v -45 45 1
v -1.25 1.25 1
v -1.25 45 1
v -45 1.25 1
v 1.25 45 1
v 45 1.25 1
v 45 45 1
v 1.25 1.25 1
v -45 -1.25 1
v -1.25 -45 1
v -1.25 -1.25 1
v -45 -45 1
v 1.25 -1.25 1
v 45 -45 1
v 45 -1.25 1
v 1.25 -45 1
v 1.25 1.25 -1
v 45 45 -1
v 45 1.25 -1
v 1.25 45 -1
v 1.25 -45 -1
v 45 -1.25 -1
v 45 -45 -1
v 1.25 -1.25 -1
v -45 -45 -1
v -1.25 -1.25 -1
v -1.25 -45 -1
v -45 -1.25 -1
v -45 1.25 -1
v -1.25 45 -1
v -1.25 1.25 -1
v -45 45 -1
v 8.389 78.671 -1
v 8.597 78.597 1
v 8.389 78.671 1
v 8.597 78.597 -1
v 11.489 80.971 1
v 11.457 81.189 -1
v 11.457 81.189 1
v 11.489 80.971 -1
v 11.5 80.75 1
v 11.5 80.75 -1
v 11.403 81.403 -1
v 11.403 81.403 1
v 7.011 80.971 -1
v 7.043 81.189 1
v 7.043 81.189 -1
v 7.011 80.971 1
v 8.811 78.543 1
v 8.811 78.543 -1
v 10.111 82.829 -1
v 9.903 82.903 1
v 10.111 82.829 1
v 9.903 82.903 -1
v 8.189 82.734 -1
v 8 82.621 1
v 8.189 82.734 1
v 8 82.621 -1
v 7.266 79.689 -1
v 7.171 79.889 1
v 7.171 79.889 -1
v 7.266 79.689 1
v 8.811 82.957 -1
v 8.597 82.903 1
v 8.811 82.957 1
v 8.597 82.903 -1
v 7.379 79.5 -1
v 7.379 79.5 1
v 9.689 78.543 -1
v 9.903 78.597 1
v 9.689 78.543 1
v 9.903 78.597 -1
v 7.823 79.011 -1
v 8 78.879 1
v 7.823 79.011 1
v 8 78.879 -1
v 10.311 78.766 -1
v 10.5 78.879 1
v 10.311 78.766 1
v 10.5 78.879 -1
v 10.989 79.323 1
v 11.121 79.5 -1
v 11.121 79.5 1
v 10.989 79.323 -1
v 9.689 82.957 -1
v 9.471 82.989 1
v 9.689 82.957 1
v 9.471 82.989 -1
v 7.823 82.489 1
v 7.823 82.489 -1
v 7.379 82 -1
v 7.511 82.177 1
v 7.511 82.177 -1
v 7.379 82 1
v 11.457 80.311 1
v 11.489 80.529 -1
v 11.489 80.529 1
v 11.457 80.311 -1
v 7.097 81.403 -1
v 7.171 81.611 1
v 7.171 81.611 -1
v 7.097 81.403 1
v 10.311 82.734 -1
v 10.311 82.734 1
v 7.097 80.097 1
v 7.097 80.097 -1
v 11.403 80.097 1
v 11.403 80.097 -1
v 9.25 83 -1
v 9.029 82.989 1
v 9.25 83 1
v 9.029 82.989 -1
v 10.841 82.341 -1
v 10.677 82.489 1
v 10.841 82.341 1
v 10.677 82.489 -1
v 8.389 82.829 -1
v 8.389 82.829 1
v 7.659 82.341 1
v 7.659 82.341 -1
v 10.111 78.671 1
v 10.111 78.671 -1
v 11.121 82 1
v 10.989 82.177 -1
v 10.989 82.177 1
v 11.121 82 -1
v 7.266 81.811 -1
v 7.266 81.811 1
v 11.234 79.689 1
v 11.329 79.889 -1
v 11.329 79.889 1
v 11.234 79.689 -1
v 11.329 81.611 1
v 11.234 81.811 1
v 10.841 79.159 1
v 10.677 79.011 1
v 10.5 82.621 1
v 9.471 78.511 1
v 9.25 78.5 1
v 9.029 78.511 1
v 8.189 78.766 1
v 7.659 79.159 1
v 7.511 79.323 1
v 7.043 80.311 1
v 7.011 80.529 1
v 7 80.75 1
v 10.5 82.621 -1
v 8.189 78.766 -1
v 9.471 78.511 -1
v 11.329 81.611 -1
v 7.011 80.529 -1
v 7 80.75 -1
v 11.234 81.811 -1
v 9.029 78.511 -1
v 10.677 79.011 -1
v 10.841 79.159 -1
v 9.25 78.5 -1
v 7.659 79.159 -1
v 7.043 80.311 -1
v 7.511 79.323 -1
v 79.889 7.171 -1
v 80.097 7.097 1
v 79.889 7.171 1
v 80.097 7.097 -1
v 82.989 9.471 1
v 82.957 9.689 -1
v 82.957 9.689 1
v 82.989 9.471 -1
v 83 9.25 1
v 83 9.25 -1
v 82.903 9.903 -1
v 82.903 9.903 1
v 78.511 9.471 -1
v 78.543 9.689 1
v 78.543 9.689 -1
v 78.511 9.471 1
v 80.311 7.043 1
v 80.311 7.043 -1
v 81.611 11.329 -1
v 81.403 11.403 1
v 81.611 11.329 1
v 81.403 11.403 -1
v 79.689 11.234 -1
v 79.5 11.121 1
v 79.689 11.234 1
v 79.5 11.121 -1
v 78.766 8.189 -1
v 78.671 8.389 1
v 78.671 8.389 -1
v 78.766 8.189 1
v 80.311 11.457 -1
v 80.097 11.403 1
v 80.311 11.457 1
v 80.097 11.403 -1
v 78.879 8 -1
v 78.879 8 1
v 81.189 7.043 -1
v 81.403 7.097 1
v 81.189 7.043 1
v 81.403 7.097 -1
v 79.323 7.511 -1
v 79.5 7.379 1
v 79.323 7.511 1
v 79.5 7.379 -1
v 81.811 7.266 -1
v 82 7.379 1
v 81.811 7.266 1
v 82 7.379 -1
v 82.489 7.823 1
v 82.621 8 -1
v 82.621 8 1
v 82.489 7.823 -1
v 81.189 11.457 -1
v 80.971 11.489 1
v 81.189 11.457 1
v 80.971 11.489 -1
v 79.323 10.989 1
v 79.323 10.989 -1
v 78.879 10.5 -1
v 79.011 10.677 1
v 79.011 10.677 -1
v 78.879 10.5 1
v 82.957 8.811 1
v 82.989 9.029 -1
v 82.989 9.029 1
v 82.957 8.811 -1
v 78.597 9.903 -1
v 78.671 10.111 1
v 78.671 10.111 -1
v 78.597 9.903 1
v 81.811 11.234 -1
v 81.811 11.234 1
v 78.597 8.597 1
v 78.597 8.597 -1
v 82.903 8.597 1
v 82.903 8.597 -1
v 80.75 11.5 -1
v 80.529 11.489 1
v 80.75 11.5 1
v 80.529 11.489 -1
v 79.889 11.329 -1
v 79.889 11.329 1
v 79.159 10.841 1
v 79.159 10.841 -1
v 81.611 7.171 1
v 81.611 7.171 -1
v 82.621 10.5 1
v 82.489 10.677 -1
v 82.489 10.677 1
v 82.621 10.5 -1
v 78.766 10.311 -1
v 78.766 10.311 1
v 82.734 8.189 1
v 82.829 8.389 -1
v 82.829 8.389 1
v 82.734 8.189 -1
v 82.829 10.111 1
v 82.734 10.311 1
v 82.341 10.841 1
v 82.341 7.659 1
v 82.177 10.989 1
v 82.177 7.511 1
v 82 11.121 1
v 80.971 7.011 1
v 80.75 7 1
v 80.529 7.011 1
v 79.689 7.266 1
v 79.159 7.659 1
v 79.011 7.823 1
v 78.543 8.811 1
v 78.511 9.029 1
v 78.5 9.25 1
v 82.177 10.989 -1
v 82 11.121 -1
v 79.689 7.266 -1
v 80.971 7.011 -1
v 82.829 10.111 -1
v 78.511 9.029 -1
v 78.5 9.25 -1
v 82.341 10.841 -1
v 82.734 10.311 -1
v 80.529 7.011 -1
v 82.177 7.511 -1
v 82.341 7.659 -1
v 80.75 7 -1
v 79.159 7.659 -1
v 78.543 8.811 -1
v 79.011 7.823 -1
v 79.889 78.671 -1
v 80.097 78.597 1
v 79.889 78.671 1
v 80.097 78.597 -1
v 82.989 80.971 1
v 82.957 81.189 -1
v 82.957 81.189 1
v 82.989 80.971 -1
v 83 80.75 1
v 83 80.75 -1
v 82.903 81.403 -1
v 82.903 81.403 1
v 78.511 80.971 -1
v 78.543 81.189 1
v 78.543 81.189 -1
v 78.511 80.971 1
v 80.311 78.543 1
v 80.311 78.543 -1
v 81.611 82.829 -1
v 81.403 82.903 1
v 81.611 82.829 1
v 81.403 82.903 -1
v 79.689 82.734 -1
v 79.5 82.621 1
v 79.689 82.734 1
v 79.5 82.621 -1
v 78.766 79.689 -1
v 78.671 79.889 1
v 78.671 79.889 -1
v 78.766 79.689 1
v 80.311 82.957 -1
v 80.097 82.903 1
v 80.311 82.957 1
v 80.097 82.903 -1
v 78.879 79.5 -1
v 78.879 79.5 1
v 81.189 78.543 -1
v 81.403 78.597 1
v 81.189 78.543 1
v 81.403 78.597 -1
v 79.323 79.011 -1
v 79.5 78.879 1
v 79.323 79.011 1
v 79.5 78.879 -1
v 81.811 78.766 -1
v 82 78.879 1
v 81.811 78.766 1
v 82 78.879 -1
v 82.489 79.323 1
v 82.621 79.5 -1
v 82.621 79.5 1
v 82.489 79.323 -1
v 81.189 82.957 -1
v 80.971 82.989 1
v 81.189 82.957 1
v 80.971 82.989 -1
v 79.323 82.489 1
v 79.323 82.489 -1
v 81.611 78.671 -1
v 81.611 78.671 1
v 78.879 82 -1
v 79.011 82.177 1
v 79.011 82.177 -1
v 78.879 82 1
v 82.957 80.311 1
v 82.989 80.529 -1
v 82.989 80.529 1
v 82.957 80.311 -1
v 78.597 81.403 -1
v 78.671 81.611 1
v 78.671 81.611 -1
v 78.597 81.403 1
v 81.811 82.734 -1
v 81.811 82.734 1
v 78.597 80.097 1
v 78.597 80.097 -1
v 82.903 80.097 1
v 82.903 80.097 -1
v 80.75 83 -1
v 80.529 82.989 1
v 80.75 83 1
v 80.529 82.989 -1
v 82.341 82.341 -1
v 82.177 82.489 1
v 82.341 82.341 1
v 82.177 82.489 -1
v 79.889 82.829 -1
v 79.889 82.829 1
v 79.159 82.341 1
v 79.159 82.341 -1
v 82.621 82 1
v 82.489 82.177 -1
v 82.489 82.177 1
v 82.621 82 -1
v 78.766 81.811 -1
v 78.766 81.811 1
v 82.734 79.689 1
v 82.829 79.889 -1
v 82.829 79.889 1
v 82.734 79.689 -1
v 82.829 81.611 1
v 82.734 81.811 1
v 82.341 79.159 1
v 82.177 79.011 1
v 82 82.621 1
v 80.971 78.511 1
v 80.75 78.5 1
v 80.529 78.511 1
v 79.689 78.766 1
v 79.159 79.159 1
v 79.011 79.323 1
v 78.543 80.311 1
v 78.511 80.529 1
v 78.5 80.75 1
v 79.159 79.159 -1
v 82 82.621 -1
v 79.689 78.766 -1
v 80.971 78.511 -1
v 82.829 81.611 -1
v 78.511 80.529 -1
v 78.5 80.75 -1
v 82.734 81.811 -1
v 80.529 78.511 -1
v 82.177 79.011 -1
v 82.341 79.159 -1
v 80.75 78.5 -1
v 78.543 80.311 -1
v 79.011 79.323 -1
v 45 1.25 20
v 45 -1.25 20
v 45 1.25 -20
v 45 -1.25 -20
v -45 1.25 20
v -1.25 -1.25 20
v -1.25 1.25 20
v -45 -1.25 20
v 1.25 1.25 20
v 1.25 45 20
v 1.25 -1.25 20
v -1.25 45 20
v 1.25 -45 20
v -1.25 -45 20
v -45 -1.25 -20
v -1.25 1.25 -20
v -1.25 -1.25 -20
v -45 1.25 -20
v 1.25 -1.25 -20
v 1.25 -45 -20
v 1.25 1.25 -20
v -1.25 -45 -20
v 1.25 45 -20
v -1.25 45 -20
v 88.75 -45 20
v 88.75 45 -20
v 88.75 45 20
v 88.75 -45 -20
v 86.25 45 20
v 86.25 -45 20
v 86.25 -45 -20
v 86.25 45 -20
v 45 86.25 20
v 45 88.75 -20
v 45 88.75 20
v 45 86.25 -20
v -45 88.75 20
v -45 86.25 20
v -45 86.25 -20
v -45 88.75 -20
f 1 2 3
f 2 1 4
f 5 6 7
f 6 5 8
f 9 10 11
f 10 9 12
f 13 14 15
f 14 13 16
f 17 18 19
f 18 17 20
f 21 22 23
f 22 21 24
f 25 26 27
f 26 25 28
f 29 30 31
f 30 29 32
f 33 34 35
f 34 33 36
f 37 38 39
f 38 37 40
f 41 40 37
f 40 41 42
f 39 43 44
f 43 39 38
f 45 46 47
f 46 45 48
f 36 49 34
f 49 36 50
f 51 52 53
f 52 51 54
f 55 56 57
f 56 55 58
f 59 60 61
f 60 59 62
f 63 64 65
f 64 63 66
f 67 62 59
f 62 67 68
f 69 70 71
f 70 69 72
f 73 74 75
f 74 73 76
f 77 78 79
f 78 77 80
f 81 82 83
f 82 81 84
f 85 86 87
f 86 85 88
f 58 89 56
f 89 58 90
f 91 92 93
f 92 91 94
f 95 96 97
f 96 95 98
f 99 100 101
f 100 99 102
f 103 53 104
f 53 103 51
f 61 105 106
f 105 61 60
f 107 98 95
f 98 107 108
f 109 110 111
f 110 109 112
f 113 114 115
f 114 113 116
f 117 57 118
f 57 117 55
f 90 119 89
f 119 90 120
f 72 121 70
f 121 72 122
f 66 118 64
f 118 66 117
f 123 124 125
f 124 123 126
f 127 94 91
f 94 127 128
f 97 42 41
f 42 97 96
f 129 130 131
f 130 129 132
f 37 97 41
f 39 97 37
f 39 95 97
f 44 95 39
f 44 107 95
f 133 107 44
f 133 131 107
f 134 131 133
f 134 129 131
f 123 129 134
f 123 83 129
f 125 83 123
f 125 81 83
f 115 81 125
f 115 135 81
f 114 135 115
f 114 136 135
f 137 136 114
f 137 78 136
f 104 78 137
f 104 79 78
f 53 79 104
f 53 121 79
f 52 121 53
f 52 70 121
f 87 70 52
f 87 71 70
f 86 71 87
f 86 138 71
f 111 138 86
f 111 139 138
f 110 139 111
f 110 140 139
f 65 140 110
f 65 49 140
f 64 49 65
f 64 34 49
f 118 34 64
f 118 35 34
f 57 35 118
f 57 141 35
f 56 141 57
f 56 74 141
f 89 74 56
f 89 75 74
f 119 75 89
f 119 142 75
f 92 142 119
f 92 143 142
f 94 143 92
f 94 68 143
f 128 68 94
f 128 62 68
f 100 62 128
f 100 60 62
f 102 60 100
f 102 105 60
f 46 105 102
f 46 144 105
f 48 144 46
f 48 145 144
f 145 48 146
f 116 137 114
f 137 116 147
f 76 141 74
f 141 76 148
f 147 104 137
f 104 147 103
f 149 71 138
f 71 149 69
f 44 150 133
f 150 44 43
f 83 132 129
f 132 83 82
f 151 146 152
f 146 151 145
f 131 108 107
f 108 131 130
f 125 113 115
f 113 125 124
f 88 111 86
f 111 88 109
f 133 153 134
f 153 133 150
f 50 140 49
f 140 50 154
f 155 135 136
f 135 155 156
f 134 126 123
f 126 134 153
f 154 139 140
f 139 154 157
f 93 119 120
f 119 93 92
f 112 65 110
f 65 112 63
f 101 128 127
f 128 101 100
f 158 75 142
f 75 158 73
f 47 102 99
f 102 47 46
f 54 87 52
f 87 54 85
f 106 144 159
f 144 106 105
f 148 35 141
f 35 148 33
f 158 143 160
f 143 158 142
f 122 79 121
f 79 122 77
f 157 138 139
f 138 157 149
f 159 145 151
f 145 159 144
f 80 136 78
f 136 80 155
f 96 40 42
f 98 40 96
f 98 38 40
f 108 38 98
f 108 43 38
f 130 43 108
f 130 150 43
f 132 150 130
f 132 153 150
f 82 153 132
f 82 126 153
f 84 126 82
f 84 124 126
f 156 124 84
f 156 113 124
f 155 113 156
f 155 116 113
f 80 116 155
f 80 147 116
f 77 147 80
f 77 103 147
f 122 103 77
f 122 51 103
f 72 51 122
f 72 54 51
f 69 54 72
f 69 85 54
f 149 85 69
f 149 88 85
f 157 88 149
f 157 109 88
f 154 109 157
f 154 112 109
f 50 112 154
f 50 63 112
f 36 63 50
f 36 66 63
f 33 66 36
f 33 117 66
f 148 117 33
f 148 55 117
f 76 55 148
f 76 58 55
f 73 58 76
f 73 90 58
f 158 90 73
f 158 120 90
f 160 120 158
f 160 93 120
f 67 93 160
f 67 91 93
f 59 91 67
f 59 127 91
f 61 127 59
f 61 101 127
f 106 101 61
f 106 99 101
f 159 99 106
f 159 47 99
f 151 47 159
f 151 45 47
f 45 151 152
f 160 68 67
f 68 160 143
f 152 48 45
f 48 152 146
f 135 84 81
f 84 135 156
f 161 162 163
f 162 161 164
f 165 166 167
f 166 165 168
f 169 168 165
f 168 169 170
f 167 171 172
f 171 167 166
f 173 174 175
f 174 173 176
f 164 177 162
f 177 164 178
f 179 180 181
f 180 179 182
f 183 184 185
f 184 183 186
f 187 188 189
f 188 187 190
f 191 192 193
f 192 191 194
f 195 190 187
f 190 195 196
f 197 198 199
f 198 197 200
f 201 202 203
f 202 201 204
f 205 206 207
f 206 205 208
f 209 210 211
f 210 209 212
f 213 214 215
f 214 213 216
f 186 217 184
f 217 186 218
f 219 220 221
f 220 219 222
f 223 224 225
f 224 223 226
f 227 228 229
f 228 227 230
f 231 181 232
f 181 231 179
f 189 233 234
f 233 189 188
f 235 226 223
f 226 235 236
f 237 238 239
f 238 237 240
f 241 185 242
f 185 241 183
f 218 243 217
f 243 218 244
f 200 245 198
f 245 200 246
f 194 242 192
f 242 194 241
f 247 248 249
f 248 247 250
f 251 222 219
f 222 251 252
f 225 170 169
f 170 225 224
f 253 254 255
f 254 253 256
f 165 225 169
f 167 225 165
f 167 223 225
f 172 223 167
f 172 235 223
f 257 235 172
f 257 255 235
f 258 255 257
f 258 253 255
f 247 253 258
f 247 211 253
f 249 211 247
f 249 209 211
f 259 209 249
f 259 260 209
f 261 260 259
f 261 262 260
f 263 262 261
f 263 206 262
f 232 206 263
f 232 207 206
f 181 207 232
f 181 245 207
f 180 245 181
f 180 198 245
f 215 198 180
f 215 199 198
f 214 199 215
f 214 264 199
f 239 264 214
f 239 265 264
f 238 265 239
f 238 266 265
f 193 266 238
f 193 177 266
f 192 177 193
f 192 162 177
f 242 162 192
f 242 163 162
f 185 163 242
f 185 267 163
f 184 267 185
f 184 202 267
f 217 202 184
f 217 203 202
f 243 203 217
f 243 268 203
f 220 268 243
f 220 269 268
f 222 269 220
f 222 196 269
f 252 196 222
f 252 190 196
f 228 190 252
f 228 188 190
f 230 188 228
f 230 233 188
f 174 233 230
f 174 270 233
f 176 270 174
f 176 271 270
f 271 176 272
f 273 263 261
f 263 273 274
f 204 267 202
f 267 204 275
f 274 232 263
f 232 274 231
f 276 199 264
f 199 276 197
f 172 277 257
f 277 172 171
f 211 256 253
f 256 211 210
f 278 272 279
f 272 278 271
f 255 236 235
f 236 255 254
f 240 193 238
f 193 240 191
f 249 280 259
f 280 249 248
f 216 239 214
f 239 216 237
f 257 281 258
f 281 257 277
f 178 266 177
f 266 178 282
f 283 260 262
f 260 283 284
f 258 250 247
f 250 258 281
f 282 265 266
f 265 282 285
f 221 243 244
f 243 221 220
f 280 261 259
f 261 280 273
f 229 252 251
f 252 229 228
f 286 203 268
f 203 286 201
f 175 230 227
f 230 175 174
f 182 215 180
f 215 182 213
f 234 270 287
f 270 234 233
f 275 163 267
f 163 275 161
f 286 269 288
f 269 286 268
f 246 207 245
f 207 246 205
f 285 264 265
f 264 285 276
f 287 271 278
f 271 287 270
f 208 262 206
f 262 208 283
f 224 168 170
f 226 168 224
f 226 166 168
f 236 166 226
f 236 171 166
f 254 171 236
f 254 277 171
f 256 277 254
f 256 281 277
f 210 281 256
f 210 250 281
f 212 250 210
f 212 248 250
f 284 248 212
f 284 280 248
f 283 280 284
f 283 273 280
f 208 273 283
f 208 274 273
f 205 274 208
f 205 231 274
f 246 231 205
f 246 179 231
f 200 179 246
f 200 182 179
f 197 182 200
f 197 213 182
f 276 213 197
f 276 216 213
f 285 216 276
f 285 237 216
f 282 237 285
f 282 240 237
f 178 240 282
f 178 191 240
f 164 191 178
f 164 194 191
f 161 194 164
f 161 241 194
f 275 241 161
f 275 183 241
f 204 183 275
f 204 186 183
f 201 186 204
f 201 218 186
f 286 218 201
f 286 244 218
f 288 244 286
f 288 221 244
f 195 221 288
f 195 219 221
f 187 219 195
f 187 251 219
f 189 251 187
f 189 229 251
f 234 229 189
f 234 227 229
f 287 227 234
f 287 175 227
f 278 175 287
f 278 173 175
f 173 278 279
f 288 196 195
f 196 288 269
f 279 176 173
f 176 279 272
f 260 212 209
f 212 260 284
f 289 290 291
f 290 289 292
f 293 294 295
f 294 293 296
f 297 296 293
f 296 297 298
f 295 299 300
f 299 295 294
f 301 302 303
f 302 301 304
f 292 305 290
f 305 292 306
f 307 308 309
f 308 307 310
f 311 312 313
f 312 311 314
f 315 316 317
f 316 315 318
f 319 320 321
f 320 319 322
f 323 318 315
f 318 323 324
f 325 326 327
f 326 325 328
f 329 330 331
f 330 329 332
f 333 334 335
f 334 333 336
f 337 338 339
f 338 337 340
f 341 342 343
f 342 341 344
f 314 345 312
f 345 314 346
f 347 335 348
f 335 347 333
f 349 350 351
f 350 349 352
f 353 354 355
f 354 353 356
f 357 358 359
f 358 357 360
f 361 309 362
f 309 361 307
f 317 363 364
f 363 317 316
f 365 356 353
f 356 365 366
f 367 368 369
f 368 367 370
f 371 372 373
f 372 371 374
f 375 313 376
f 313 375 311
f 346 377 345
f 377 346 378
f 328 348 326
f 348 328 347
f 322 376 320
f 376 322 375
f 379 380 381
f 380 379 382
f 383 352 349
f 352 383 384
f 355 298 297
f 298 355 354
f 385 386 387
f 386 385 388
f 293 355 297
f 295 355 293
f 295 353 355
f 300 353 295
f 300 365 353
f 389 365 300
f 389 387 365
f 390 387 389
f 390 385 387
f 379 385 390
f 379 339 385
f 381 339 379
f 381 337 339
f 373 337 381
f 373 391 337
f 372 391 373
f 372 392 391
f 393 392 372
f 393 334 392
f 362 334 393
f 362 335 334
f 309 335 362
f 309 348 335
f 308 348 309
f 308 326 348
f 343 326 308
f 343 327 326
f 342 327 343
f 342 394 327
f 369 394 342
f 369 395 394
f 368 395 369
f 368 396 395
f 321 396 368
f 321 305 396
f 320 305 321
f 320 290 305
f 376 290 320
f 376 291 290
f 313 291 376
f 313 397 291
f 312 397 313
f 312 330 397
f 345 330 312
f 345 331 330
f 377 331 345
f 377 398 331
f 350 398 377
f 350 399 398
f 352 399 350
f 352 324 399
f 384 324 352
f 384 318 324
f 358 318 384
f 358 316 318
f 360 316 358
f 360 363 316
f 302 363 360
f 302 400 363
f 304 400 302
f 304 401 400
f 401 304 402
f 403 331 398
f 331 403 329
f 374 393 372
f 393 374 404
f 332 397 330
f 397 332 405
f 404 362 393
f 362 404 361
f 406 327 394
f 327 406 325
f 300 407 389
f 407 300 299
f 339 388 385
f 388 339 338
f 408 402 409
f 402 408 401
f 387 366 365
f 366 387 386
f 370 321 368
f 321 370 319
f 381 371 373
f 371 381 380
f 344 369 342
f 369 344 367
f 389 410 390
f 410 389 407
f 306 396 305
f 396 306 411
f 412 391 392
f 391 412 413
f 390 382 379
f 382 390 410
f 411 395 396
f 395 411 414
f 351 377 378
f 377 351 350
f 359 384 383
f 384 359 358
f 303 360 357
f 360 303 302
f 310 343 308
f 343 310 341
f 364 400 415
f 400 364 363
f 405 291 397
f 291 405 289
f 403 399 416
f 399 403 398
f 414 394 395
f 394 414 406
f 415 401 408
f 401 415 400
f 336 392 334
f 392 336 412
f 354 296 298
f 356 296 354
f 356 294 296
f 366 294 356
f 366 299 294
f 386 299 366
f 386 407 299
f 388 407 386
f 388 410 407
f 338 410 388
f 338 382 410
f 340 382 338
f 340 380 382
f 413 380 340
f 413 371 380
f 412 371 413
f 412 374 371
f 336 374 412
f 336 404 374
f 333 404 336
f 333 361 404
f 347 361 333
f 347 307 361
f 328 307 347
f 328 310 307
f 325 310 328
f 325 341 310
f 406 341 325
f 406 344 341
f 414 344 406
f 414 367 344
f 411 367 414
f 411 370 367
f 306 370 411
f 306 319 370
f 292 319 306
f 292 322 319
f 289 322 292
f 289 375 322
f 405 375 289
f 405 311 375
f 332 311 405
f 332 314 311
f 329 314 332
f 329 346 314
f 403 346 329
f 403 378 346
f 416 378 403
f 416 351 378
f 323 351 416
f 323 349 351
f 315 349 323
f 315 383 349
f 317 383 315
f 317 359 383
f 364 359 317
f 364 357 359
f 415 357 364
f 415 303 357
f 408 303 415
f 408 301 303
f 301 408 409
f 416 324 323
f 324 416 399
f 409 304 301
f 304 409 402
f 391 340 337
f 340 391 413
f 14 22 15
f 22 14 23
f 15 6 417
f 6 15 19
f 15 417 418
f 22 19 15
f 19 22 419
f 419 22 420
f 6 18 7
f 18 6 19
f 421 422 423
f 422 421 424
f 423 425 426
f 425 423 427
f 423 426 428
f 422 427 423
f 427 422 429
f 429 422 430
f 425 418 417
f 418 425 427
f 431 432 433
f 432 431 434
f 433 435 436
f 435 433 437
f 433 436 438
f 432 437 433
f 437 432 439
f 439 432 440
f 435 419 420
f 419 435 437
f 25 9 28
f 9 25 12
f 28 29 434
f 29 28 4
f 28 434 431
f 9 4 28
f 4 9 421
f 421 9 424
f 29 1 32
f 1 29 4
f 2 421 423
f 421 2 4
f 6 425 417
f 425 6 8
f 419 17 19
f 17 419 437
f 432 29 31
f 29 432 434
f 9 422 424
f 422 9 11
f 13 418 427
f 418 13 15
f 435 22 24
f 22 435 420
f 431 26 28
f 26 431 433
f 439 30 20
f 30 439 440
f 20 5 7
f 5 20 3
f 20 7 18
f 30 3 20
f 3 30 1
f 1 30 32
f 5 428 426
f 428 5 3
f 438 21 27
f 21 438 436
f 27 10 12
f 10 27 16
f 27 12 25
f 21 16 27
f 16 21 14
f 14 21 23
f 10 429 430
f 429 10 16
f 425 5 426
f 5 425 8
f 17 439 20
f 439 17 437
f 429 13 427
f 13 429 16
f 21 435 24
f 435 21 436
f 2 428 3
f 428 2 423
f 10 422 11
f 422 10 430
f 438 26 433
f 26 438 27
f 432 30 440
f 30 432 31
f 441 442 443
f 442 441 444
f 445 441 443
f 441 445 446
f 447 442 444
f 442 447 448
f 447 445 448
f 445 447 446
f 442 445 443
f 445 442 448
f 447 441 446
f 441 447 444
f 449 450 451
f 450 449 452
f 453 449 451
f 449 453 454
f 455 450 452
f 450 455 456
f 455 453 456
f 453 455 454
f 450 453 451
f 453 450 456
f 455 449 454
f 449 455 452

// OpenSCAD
// Dimensions for DIY magnetic stirrer housing from 80mm PC case fan
$fn = 64;

// Outer size of housing (X x Y)
outer_size_x = 90;
outer_size_y = 90;

// Wall thickness (2.5 mm)
wall_thickness = 2.5;

// Top plate thickness (2 mm)
top_thickness = 2.0;

// Height of housing (from z=0 to z=40)
housing_height = 40;

// Hole diameter (4.5 mm) for M4 screws
hole_diameter = 4.5;

// Screw hole pattern (71.5 mm square, centered on top plate)
hole_spacing = 71.5;

// Power cable notch: 12 mm wide, centered along the wall, reaching 8 mm down from open edge (from z=32 to z=40)
notch_width = 12;
notch_depth = 8;

// Correct the model so that:
// - The housing is properly centered and starts at z=0
// - The top plate lies on z=0 to z=2, and walls rise from z=0 to z=40
// - The part is watertight and fully solid with correct geometry
// - The top plate is at z=0 to z=2, and walls extend from z=0 to z=40
// - The notch is cut in one wall (front wall) from z=32 to z=40, 12 mm wide, centered in y

// Start with the top plate (z=0 to z=2)
cube([outer_size_x, outer_size_y, top_thickness], center=true);

// Add the four walls, extending from z=0 to z=40
// Wall on left (x=0 to x=90)
translate([0, 0, 0]) 
    cube([wall_thickness, outer_size_y, housing_height], center=true);

// Wall on right (x=90 to x=0)
translate([outer_size_x - wall_thickness, 0, 0]) 
    cube([wall_thickness, outer_size_y, housing_height], center=true);

// Wall on front (y=0 to y=90)
translate([0, 0, 0]) 
    cube([outer_size_x, wall_thickness, housing_height], center=true);

// Wall on back (y=90 to y=0)
translate([0, outer_size_y - wall_thickness, 0]) 
    cube([outer_size_x, wall_thickness, housing_height], center=true);

// Drill four 4.5 mm holes for M4 screws on the top plate (centered, 71.5 mm apart)
for (i = [0, 1]) {
    for (j = [0, 1]) {
        translate([
            45 - hole_spacing/2 + i * hole_spacing,
            45 - hole_spacing/2 + j * hole_spacing,
            0
        ]) 
        cylinder(d=hole_diameter, h=top_thickness, center=true);
    }
}

// Cut a notch for power cable in the front wall (from z=32 to z=40, 12 mm wide, centered in y)
// The notch should be 8 mm deep (from z=32 to z=40), 12 mm wide, centered at y=45
// We use difference to cut the notch from the front wall
translate([0, 0, 0]) // start at z=0
difference() {
    // Front wall: 90x2.5x40, from z=0 to z=40
    cube([outer_size_x, wall_thickness, housing_height], center=true);
    
    // Notch: 12 mm wide, centered in y, from z=32 to z=40 (8 mm deep)
    translate([0, 0, 32]) 
        cube([outer_size_x, notch_width, notch_depth], center=true);
}
